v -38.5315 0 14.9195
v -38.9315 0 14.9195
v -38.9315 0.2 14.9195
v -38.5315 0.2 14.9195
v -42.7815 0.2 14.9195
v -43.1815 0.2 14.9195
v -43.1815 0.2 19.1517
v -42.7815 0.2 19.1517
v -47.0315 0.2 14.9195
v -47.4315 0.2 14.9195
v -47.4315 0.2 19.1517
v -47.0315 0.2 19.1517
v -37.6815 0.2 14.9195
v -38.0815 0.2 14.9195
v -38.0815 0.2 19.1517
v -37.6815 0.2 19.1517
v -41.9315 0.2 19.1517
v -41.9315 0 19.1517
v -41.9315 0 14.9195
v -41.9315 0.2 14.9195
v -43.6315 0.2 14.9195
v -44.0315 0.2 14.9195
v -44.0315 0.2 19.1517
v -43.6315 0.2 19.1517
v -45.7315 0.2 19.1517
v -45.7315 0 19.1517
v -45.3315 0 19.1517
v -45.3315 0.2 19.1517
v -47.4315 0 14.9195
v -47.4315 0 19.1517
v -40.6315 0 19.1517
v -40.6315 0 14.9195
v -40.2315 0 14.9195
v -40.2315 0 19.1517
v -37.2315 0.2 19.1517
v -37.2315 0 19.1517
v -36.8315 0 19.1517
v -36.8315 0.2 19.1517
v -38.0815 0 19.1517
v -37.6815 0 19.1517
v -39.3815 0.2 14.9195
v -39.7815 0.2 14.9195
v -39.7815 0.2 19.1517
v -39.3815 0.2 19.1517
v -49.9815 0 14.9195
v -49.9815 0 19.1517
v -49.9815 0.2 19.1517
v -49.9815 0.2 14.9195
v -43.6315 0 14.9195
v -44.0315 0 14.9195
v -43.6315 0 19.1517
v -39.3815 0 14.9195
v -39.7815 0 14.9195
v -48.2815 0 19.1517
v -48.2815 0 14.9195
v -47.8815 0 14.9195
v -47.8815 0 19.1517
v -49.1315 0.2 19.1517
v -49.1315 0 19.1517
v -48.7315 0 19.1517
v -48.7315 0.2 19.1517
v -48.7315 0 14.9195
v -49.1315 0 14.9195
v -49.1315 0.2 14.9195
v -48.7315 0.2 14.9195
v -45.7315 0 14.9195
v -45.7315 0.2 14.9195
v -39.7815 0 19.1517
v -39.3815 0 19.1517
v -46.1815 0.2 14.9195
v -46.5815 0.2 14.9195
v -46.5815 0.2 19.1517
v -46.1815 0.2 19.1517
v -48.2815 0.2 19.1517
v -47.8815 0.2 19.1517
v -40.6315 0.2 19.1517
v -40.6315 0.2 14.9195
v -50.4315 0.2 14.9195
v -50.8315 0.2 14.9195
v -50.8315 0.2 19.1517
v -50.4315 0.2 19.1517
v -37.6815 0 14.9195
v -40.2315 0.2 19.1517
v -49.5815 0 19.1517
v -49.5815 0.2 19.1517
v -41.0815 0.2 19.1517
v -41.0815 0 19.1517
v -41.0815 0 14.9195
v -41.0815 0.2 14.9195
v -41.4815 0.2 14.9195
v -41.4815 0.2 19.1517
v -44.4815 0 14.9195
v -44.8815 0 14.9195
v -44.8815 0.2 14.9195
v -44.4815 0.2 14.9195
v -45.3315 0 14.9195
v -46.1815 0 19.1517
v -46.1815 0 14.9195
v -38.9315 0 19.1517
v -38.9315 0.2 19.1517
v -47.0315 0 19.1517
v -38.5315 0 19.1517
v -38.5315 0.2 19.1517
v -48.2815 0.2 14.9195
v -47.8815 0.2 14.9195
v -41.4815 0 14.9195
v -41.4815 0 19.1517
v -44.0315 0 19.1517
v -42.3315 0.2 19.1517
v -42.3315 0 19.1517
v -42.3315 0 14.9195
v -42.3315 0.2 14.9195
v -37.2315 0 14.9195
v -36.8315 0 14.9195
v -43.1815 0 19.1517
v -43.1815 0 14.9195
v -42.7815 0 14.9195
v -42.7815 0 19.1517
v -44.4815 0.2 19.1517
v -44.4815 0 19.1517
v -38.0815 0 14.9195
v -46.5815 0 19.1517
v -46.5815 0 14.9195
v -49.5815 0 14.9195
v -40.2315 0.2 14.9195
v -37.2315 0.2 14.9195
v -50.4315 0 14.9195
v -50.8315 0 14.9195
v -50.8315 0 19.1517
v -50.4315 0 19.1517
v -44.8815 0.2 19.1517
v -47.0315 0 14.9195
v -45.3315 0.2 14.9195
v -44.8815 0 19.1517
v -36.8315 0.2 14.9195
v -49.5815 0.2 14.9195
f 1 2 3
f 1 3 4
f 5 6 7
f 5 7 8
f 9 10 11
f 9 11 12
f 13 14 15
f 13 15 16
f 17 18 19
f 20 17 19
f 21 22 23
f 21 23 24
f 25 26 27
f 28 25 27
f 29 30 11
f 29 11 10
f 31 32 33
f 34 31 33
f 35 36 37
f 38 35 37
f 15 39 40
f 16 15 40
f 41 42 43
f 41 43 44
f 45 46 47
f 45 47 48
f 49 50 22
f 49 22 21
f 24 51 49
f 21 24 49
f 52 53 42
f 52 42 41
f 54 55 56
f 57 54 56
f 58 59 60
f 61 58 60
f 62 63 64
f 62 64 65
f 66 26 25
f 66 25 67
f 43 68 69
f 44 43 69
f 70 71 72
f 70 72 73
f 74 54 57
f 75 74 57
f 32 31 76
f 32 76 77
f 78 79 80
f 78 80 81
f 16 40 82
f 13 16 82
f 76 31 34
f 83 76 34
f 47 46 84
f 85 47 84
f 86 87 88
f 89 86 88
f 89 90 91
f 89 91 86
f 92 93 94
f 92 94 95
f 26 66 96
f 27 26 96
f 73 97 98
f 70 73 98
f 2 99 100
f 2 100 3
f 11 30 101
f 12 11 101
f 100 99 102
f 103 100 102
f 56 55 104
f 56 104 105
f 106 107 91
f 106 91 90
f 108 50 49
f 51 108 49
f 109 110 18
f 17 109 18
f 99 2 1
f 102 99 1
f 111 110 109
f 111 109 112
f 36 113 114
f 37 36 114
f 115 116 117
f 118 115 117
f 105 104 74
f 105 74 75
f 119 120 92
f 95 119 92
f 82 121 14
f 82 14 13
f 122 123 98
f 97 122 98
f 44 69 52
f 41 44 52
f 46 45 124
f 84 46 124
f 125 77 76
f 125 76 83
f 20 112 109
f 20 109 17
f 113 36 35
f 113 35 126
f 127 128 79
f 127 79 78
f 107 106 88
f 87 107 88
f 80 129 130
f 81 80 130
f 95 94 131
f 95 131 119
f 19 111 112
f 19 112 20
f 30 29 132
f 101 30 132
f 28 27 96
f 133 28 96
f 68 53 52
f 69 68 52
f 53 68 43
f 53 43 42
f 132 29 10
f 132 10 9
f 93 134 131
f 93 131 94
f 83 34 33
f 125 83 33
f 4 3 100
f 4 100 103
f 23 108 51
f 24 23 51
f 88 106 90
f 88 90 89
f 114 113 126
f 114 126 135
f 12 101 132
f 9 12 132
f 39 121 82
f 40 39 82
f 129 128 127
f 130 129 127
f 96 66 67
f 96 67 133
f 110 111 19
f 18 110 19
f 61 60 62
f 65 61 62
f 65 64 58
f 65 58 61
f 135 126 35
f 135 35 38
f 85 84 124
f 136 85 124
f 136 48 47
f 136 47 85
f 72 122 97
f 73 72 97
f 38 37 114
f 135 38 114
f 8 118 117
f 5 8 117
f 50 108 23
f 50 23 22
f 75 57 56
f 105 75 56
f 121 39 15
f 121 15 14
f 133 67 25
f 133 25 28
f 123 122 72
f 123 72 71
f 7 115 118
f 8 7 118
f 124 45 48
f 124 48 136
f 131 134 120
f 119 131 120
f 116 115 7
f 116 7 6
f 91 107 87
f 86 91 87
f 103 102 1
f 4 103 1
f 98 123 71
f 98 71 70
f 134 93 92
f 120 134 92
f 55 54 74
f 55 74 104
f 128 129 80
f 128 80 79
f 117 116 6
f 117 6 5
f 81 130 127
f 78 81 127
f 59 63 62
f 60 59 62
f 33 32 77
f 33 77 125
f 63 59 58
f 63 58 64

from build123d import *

# Parameters (mm, degrees)
SKETCH1_W              = 0.4
SKETCH1_H              = 4.232283465
BOSS_EXTRUDE1_DEPTH    = 0.2
BOSS_EXTRUDE1_2_DEPTH  = 0.2
BOSS_EXTRUDE1_3_DEPTH  = 0.2
BOSS_EXTRUDE1_4_DEPTH  = 0.2
BOSS_EXTRUDE1_5_DEPTH  = 0.2
BOSS_EXTRUDE1_6_DEPTH  = 0.2
BOSS_EXTRUDE1_7_DEPTH  = 0.2
BOSS_EXTRUDE1_8_DEPTH  = 0.2
BOSS_EXTRUDE1_9_DEPTH  = 0.2
BOSS_EXTRUDE1_10_DEPTH = 0.2
BOSS_EXTRUDE1_11_DEPTH = 0.2
BOSS_EXTRUDE1_12_DEPTH = 0.2
BOSS_EXTRUDE1_13_DEPTH = 0.2
BOSS_EXTRUDE1_14_DEPTH = 0.2
BOSS_EXTRUDE1_15_DEPTH = 0.2
BOSS_EXTRUDE1_16_DEPTH = 0.2
BOSS_EXTRUDE1_17_DEPTH = 0.2


with BuildPart() as part:
    # Sketch1 → Boss-Extrude1 (new body)
    with BuildSketch(Plane(origin=(0, 0, 0), x_dir=(1, 0, 0), z_dir=(0, 1, 0))):
        with Locations((-49.781526204, -17.035592861)):
            Rectangle(SKETCH1_W, SKETCH1_H)
    extrude(amount=BOSS_EXTRUDE1_DEPTH)


with BuildPart() as body_2:
    # Sketch1 → Boss-Extrude1 2 (new body)
    with BuildSketch(Plane(origin=(0, 0, 0), x_dir=(1, 0, 0), z_dir=(0, 1, 0))):
        with Locations((-50.631526204, -17.035592861)):
            Rectangle(SKETCH1_W, SKETCH1_H)
    extrude(amount=BOSS_EXTRUDE1_2_DEPTH)


with BuildPart() as body_3:
    # Sketch1 → Boss-Extrude1 3 (new body)
    with BuildSketch(Plane(origin=(0, 0, 0), x_dir=(1, 0, 0), z_dir=(0, 1, 0))):
        with Locations((-48.931526204, -17.035592861)):
            Rectangle(SKETCH1_W, SKETCH1_H)
    extrude(amount=BOSS_EXTRUDE1_3_DEPTH)


with BuildPart() as body_4:
    # Sketch1 → Boss-Extrude1 4 (new body)
    with BuildSketch(Plane(origin=(0, 0, 0), x_dir=(1, 0, 0), z_dir=(0, 1, 0))):
        with Locations((-48.081526204, -17.035592861)):
            Rectangle(SKETCH1_W, SKETCH1_H)
    extrude(amount=BOSS_EXTRUDE1_4_DEPTH)


with BuildPart() as body_5:
    # Sketch1 → Boss-Extrude1 5 (new body)
    with BuildSketch(Plane(origin=(0, 0, 0), x_dir=(1, 0, 0), z_dir=(0, 1, 0))):
        with Locations((-47.231526204, -17.035592861)):
            Rectangle(SKETCH1_W, SKETCH1_H)
    extrude(amount=BOSS_EXTRUDE1_5_DEPTH)


with BuildPart() as body_6:
    # Sketch1 → Boss-Extrude1 6 (new body)
    with BuildSketch(Plane(origin=(0, 0, 0), x_dir=(1, 0, 0), z_dir=(0, 1, 0))):
        with Locations((-46.381526204, -17.035592861)):
            Rectangle(SKETCH1_W, SKETCH1_H)
    extrude(amount=BOSS_EXTRUDE1_6_DEPTH)


with BuildPart() as body_7:
    # Sketch1 → Boss-Extrude1 7 (new body)
    with BuildSketch(Plane(origin=(0, 0, 0), x_dir=(1, 0, 0), z_dir=(0, 1, 0))):
        with Locations((-45.531526204, -17.035592861)):
            Rectangle(SKETCH1_W, SKETCH1_H)
    extrude(amount=BOSS_EXTRUDE1_7_DEPTH)


with BuildPart() as body_8:
    # Sketch1 → Boss-Extrude1 8 (new body)
    with BuildSketch(Plane(origin=(0, 0, 0), x_dir=(1, 0, 0), z_dir=(0, 1, 0))):
        with Locations((-44.681526204, -17.035592861)):
            Rectangle(SKETCH1_W, SKETCH1_H)
    extrude(amount=BOSS_EXTRUDE1_8_DEPTH)


with BuildPart() as body_9:
    # Sketch1 → Boss-Extrude1 9 (new body)
    with BuildSketch(Plane(origin=(0, 0, 0), x_dir=(1, 0, 0), z_dir=(0, 1, 0))):
        with Locations((-43.831526204, -17.035592861)):
            Rectangle(SKETCH1_W, SKETCH1_H)
    extrude(amount=BOSS_EXTRUDE1_9_DEPTH)


with BuildPart() as body_10:
    # Sketch1 → Boss-Extrude1 10 (new body)
    with BuildSketch(Plane(origin=(0, 0, 0), x_dir=(1, 0, 0), z_dir=(0, 1, 0))):
        with Locations((-42.981526204, -17.035592861)):
            Rectangle(SKETCH1_W, SKETCH1_H)
    extrude(amount=BOSS_EXTRUDE1_10_DEPTH)


with BuildPart() as body_11:
    # Sketch1 → Boss-Extrude1 11 (new body)
    with BuildSketch(Plane(origin=(0, 0, 0), x_dir=(1, 0, 0), z_dir=(0, 1, 0))):
        with Locations((-42.131526204, -17.035592861)):
            Rectangle(SKETCH1_W, SKETCH1_H)
    extrude(amount=BOSS_EXTRUDE1_11_DEPTH)


with BuildPart() as body_12:
    # Sketch1 → Boss-Extrude1 12 (new body)
    with BuildSketch(Plane(origin=(0, 0, 0), x_dir=(1, 0, 0), z_dir=(0, 1, 0))):
        with Locations((-41.281526204, -17.035592861)):
            Rectangle(SKETCH1_W, SKETCH1_H)
    extrude(amount=BOSS_EXTRUDE1_12_DEPTH)


with BuildPart() as body_13:
    # Sketch1 → Boss-Extrude1 13 (new body)
    with BuildSketch(Plane(origin=(0, 0, 0), x_dir=(1, 0, 0), z_dir=(0, 1, 0))):
        with Locations((-40.431526204, -17.035592861)):
            Rectangle(SKETCH1_W, SKETCH1_H)
    extrude(amount=BOSS_EXTRUDE1_13_DEPTH)


with BuildPart() as body_14:
    # Sketch1 → Boss-Extrude1 14 (new body)
    with BuildSketch(Plane(origin=(0, 0, 0), x_dir=(1, 0, 0), z_dir=(0, 1, 0))):
        with Locations((-39.581526204, -17.035592861)):
            Rectangle(SKETCH1_W, SKETCH1_H)
    extrude(amount=BOSS_EXTRUDE1_14_DEPTH)


with BuildPart() as body_15:
    # Sketch1 → Boss-Extrude1 15 (new body)
    with BuildSketch(Plane(origin=(0, 0, 0), x_dir=(1, 0, 0), z_dir=(0, 1, 0))):
        with Locations((-38.731526204, -17.035592861)):
            Rectangle(SKETCH1_W, SKETCH1_H)
    extrude(amount=BOSS_EXTRUDE1_15_DEPTH)


with BuildPart() as body_16:
    # Sketch1 → Boss-Extrude1 16 (new body)
    with BuildSketch(Plane(origin=(0, 0, 0), x_dir=(1, 0, 0), z_dir=(0, 1, 0))):
        with Locations((-37.881526204, -17.035592861)):
            Rectangle(SKETCH1_W, SKETCH1_H)
    extrude(amount=BOSS_EXTRUDE1_16_DEPTH)


with BuildPart() as body_17:
    # Sketch1 → Boss-Extrude1 17 (new body)
    with BuildSketch(Plane(origin=(0, 0, 0), x_dir=(1, 0, 0), z_dir=(0, 1, 0))):
        with Locations((-37.031526204, -17.035592861)):
            Rectangle(SKETCH1_W, SKETCH1_H)
    extrude(amount=BOSS_EXTRUDE1_17_DEPTH)


solid = Compound([part.part, body_2.part, body_3.part, body_4.part, body_5.part, body_6.part, body_7.part, body_8.part, body_9.part, body_10.part, body_11.part, body_12.part, body_13.part, body_14.part, body_15.part, body_16.part, body_17.part])
